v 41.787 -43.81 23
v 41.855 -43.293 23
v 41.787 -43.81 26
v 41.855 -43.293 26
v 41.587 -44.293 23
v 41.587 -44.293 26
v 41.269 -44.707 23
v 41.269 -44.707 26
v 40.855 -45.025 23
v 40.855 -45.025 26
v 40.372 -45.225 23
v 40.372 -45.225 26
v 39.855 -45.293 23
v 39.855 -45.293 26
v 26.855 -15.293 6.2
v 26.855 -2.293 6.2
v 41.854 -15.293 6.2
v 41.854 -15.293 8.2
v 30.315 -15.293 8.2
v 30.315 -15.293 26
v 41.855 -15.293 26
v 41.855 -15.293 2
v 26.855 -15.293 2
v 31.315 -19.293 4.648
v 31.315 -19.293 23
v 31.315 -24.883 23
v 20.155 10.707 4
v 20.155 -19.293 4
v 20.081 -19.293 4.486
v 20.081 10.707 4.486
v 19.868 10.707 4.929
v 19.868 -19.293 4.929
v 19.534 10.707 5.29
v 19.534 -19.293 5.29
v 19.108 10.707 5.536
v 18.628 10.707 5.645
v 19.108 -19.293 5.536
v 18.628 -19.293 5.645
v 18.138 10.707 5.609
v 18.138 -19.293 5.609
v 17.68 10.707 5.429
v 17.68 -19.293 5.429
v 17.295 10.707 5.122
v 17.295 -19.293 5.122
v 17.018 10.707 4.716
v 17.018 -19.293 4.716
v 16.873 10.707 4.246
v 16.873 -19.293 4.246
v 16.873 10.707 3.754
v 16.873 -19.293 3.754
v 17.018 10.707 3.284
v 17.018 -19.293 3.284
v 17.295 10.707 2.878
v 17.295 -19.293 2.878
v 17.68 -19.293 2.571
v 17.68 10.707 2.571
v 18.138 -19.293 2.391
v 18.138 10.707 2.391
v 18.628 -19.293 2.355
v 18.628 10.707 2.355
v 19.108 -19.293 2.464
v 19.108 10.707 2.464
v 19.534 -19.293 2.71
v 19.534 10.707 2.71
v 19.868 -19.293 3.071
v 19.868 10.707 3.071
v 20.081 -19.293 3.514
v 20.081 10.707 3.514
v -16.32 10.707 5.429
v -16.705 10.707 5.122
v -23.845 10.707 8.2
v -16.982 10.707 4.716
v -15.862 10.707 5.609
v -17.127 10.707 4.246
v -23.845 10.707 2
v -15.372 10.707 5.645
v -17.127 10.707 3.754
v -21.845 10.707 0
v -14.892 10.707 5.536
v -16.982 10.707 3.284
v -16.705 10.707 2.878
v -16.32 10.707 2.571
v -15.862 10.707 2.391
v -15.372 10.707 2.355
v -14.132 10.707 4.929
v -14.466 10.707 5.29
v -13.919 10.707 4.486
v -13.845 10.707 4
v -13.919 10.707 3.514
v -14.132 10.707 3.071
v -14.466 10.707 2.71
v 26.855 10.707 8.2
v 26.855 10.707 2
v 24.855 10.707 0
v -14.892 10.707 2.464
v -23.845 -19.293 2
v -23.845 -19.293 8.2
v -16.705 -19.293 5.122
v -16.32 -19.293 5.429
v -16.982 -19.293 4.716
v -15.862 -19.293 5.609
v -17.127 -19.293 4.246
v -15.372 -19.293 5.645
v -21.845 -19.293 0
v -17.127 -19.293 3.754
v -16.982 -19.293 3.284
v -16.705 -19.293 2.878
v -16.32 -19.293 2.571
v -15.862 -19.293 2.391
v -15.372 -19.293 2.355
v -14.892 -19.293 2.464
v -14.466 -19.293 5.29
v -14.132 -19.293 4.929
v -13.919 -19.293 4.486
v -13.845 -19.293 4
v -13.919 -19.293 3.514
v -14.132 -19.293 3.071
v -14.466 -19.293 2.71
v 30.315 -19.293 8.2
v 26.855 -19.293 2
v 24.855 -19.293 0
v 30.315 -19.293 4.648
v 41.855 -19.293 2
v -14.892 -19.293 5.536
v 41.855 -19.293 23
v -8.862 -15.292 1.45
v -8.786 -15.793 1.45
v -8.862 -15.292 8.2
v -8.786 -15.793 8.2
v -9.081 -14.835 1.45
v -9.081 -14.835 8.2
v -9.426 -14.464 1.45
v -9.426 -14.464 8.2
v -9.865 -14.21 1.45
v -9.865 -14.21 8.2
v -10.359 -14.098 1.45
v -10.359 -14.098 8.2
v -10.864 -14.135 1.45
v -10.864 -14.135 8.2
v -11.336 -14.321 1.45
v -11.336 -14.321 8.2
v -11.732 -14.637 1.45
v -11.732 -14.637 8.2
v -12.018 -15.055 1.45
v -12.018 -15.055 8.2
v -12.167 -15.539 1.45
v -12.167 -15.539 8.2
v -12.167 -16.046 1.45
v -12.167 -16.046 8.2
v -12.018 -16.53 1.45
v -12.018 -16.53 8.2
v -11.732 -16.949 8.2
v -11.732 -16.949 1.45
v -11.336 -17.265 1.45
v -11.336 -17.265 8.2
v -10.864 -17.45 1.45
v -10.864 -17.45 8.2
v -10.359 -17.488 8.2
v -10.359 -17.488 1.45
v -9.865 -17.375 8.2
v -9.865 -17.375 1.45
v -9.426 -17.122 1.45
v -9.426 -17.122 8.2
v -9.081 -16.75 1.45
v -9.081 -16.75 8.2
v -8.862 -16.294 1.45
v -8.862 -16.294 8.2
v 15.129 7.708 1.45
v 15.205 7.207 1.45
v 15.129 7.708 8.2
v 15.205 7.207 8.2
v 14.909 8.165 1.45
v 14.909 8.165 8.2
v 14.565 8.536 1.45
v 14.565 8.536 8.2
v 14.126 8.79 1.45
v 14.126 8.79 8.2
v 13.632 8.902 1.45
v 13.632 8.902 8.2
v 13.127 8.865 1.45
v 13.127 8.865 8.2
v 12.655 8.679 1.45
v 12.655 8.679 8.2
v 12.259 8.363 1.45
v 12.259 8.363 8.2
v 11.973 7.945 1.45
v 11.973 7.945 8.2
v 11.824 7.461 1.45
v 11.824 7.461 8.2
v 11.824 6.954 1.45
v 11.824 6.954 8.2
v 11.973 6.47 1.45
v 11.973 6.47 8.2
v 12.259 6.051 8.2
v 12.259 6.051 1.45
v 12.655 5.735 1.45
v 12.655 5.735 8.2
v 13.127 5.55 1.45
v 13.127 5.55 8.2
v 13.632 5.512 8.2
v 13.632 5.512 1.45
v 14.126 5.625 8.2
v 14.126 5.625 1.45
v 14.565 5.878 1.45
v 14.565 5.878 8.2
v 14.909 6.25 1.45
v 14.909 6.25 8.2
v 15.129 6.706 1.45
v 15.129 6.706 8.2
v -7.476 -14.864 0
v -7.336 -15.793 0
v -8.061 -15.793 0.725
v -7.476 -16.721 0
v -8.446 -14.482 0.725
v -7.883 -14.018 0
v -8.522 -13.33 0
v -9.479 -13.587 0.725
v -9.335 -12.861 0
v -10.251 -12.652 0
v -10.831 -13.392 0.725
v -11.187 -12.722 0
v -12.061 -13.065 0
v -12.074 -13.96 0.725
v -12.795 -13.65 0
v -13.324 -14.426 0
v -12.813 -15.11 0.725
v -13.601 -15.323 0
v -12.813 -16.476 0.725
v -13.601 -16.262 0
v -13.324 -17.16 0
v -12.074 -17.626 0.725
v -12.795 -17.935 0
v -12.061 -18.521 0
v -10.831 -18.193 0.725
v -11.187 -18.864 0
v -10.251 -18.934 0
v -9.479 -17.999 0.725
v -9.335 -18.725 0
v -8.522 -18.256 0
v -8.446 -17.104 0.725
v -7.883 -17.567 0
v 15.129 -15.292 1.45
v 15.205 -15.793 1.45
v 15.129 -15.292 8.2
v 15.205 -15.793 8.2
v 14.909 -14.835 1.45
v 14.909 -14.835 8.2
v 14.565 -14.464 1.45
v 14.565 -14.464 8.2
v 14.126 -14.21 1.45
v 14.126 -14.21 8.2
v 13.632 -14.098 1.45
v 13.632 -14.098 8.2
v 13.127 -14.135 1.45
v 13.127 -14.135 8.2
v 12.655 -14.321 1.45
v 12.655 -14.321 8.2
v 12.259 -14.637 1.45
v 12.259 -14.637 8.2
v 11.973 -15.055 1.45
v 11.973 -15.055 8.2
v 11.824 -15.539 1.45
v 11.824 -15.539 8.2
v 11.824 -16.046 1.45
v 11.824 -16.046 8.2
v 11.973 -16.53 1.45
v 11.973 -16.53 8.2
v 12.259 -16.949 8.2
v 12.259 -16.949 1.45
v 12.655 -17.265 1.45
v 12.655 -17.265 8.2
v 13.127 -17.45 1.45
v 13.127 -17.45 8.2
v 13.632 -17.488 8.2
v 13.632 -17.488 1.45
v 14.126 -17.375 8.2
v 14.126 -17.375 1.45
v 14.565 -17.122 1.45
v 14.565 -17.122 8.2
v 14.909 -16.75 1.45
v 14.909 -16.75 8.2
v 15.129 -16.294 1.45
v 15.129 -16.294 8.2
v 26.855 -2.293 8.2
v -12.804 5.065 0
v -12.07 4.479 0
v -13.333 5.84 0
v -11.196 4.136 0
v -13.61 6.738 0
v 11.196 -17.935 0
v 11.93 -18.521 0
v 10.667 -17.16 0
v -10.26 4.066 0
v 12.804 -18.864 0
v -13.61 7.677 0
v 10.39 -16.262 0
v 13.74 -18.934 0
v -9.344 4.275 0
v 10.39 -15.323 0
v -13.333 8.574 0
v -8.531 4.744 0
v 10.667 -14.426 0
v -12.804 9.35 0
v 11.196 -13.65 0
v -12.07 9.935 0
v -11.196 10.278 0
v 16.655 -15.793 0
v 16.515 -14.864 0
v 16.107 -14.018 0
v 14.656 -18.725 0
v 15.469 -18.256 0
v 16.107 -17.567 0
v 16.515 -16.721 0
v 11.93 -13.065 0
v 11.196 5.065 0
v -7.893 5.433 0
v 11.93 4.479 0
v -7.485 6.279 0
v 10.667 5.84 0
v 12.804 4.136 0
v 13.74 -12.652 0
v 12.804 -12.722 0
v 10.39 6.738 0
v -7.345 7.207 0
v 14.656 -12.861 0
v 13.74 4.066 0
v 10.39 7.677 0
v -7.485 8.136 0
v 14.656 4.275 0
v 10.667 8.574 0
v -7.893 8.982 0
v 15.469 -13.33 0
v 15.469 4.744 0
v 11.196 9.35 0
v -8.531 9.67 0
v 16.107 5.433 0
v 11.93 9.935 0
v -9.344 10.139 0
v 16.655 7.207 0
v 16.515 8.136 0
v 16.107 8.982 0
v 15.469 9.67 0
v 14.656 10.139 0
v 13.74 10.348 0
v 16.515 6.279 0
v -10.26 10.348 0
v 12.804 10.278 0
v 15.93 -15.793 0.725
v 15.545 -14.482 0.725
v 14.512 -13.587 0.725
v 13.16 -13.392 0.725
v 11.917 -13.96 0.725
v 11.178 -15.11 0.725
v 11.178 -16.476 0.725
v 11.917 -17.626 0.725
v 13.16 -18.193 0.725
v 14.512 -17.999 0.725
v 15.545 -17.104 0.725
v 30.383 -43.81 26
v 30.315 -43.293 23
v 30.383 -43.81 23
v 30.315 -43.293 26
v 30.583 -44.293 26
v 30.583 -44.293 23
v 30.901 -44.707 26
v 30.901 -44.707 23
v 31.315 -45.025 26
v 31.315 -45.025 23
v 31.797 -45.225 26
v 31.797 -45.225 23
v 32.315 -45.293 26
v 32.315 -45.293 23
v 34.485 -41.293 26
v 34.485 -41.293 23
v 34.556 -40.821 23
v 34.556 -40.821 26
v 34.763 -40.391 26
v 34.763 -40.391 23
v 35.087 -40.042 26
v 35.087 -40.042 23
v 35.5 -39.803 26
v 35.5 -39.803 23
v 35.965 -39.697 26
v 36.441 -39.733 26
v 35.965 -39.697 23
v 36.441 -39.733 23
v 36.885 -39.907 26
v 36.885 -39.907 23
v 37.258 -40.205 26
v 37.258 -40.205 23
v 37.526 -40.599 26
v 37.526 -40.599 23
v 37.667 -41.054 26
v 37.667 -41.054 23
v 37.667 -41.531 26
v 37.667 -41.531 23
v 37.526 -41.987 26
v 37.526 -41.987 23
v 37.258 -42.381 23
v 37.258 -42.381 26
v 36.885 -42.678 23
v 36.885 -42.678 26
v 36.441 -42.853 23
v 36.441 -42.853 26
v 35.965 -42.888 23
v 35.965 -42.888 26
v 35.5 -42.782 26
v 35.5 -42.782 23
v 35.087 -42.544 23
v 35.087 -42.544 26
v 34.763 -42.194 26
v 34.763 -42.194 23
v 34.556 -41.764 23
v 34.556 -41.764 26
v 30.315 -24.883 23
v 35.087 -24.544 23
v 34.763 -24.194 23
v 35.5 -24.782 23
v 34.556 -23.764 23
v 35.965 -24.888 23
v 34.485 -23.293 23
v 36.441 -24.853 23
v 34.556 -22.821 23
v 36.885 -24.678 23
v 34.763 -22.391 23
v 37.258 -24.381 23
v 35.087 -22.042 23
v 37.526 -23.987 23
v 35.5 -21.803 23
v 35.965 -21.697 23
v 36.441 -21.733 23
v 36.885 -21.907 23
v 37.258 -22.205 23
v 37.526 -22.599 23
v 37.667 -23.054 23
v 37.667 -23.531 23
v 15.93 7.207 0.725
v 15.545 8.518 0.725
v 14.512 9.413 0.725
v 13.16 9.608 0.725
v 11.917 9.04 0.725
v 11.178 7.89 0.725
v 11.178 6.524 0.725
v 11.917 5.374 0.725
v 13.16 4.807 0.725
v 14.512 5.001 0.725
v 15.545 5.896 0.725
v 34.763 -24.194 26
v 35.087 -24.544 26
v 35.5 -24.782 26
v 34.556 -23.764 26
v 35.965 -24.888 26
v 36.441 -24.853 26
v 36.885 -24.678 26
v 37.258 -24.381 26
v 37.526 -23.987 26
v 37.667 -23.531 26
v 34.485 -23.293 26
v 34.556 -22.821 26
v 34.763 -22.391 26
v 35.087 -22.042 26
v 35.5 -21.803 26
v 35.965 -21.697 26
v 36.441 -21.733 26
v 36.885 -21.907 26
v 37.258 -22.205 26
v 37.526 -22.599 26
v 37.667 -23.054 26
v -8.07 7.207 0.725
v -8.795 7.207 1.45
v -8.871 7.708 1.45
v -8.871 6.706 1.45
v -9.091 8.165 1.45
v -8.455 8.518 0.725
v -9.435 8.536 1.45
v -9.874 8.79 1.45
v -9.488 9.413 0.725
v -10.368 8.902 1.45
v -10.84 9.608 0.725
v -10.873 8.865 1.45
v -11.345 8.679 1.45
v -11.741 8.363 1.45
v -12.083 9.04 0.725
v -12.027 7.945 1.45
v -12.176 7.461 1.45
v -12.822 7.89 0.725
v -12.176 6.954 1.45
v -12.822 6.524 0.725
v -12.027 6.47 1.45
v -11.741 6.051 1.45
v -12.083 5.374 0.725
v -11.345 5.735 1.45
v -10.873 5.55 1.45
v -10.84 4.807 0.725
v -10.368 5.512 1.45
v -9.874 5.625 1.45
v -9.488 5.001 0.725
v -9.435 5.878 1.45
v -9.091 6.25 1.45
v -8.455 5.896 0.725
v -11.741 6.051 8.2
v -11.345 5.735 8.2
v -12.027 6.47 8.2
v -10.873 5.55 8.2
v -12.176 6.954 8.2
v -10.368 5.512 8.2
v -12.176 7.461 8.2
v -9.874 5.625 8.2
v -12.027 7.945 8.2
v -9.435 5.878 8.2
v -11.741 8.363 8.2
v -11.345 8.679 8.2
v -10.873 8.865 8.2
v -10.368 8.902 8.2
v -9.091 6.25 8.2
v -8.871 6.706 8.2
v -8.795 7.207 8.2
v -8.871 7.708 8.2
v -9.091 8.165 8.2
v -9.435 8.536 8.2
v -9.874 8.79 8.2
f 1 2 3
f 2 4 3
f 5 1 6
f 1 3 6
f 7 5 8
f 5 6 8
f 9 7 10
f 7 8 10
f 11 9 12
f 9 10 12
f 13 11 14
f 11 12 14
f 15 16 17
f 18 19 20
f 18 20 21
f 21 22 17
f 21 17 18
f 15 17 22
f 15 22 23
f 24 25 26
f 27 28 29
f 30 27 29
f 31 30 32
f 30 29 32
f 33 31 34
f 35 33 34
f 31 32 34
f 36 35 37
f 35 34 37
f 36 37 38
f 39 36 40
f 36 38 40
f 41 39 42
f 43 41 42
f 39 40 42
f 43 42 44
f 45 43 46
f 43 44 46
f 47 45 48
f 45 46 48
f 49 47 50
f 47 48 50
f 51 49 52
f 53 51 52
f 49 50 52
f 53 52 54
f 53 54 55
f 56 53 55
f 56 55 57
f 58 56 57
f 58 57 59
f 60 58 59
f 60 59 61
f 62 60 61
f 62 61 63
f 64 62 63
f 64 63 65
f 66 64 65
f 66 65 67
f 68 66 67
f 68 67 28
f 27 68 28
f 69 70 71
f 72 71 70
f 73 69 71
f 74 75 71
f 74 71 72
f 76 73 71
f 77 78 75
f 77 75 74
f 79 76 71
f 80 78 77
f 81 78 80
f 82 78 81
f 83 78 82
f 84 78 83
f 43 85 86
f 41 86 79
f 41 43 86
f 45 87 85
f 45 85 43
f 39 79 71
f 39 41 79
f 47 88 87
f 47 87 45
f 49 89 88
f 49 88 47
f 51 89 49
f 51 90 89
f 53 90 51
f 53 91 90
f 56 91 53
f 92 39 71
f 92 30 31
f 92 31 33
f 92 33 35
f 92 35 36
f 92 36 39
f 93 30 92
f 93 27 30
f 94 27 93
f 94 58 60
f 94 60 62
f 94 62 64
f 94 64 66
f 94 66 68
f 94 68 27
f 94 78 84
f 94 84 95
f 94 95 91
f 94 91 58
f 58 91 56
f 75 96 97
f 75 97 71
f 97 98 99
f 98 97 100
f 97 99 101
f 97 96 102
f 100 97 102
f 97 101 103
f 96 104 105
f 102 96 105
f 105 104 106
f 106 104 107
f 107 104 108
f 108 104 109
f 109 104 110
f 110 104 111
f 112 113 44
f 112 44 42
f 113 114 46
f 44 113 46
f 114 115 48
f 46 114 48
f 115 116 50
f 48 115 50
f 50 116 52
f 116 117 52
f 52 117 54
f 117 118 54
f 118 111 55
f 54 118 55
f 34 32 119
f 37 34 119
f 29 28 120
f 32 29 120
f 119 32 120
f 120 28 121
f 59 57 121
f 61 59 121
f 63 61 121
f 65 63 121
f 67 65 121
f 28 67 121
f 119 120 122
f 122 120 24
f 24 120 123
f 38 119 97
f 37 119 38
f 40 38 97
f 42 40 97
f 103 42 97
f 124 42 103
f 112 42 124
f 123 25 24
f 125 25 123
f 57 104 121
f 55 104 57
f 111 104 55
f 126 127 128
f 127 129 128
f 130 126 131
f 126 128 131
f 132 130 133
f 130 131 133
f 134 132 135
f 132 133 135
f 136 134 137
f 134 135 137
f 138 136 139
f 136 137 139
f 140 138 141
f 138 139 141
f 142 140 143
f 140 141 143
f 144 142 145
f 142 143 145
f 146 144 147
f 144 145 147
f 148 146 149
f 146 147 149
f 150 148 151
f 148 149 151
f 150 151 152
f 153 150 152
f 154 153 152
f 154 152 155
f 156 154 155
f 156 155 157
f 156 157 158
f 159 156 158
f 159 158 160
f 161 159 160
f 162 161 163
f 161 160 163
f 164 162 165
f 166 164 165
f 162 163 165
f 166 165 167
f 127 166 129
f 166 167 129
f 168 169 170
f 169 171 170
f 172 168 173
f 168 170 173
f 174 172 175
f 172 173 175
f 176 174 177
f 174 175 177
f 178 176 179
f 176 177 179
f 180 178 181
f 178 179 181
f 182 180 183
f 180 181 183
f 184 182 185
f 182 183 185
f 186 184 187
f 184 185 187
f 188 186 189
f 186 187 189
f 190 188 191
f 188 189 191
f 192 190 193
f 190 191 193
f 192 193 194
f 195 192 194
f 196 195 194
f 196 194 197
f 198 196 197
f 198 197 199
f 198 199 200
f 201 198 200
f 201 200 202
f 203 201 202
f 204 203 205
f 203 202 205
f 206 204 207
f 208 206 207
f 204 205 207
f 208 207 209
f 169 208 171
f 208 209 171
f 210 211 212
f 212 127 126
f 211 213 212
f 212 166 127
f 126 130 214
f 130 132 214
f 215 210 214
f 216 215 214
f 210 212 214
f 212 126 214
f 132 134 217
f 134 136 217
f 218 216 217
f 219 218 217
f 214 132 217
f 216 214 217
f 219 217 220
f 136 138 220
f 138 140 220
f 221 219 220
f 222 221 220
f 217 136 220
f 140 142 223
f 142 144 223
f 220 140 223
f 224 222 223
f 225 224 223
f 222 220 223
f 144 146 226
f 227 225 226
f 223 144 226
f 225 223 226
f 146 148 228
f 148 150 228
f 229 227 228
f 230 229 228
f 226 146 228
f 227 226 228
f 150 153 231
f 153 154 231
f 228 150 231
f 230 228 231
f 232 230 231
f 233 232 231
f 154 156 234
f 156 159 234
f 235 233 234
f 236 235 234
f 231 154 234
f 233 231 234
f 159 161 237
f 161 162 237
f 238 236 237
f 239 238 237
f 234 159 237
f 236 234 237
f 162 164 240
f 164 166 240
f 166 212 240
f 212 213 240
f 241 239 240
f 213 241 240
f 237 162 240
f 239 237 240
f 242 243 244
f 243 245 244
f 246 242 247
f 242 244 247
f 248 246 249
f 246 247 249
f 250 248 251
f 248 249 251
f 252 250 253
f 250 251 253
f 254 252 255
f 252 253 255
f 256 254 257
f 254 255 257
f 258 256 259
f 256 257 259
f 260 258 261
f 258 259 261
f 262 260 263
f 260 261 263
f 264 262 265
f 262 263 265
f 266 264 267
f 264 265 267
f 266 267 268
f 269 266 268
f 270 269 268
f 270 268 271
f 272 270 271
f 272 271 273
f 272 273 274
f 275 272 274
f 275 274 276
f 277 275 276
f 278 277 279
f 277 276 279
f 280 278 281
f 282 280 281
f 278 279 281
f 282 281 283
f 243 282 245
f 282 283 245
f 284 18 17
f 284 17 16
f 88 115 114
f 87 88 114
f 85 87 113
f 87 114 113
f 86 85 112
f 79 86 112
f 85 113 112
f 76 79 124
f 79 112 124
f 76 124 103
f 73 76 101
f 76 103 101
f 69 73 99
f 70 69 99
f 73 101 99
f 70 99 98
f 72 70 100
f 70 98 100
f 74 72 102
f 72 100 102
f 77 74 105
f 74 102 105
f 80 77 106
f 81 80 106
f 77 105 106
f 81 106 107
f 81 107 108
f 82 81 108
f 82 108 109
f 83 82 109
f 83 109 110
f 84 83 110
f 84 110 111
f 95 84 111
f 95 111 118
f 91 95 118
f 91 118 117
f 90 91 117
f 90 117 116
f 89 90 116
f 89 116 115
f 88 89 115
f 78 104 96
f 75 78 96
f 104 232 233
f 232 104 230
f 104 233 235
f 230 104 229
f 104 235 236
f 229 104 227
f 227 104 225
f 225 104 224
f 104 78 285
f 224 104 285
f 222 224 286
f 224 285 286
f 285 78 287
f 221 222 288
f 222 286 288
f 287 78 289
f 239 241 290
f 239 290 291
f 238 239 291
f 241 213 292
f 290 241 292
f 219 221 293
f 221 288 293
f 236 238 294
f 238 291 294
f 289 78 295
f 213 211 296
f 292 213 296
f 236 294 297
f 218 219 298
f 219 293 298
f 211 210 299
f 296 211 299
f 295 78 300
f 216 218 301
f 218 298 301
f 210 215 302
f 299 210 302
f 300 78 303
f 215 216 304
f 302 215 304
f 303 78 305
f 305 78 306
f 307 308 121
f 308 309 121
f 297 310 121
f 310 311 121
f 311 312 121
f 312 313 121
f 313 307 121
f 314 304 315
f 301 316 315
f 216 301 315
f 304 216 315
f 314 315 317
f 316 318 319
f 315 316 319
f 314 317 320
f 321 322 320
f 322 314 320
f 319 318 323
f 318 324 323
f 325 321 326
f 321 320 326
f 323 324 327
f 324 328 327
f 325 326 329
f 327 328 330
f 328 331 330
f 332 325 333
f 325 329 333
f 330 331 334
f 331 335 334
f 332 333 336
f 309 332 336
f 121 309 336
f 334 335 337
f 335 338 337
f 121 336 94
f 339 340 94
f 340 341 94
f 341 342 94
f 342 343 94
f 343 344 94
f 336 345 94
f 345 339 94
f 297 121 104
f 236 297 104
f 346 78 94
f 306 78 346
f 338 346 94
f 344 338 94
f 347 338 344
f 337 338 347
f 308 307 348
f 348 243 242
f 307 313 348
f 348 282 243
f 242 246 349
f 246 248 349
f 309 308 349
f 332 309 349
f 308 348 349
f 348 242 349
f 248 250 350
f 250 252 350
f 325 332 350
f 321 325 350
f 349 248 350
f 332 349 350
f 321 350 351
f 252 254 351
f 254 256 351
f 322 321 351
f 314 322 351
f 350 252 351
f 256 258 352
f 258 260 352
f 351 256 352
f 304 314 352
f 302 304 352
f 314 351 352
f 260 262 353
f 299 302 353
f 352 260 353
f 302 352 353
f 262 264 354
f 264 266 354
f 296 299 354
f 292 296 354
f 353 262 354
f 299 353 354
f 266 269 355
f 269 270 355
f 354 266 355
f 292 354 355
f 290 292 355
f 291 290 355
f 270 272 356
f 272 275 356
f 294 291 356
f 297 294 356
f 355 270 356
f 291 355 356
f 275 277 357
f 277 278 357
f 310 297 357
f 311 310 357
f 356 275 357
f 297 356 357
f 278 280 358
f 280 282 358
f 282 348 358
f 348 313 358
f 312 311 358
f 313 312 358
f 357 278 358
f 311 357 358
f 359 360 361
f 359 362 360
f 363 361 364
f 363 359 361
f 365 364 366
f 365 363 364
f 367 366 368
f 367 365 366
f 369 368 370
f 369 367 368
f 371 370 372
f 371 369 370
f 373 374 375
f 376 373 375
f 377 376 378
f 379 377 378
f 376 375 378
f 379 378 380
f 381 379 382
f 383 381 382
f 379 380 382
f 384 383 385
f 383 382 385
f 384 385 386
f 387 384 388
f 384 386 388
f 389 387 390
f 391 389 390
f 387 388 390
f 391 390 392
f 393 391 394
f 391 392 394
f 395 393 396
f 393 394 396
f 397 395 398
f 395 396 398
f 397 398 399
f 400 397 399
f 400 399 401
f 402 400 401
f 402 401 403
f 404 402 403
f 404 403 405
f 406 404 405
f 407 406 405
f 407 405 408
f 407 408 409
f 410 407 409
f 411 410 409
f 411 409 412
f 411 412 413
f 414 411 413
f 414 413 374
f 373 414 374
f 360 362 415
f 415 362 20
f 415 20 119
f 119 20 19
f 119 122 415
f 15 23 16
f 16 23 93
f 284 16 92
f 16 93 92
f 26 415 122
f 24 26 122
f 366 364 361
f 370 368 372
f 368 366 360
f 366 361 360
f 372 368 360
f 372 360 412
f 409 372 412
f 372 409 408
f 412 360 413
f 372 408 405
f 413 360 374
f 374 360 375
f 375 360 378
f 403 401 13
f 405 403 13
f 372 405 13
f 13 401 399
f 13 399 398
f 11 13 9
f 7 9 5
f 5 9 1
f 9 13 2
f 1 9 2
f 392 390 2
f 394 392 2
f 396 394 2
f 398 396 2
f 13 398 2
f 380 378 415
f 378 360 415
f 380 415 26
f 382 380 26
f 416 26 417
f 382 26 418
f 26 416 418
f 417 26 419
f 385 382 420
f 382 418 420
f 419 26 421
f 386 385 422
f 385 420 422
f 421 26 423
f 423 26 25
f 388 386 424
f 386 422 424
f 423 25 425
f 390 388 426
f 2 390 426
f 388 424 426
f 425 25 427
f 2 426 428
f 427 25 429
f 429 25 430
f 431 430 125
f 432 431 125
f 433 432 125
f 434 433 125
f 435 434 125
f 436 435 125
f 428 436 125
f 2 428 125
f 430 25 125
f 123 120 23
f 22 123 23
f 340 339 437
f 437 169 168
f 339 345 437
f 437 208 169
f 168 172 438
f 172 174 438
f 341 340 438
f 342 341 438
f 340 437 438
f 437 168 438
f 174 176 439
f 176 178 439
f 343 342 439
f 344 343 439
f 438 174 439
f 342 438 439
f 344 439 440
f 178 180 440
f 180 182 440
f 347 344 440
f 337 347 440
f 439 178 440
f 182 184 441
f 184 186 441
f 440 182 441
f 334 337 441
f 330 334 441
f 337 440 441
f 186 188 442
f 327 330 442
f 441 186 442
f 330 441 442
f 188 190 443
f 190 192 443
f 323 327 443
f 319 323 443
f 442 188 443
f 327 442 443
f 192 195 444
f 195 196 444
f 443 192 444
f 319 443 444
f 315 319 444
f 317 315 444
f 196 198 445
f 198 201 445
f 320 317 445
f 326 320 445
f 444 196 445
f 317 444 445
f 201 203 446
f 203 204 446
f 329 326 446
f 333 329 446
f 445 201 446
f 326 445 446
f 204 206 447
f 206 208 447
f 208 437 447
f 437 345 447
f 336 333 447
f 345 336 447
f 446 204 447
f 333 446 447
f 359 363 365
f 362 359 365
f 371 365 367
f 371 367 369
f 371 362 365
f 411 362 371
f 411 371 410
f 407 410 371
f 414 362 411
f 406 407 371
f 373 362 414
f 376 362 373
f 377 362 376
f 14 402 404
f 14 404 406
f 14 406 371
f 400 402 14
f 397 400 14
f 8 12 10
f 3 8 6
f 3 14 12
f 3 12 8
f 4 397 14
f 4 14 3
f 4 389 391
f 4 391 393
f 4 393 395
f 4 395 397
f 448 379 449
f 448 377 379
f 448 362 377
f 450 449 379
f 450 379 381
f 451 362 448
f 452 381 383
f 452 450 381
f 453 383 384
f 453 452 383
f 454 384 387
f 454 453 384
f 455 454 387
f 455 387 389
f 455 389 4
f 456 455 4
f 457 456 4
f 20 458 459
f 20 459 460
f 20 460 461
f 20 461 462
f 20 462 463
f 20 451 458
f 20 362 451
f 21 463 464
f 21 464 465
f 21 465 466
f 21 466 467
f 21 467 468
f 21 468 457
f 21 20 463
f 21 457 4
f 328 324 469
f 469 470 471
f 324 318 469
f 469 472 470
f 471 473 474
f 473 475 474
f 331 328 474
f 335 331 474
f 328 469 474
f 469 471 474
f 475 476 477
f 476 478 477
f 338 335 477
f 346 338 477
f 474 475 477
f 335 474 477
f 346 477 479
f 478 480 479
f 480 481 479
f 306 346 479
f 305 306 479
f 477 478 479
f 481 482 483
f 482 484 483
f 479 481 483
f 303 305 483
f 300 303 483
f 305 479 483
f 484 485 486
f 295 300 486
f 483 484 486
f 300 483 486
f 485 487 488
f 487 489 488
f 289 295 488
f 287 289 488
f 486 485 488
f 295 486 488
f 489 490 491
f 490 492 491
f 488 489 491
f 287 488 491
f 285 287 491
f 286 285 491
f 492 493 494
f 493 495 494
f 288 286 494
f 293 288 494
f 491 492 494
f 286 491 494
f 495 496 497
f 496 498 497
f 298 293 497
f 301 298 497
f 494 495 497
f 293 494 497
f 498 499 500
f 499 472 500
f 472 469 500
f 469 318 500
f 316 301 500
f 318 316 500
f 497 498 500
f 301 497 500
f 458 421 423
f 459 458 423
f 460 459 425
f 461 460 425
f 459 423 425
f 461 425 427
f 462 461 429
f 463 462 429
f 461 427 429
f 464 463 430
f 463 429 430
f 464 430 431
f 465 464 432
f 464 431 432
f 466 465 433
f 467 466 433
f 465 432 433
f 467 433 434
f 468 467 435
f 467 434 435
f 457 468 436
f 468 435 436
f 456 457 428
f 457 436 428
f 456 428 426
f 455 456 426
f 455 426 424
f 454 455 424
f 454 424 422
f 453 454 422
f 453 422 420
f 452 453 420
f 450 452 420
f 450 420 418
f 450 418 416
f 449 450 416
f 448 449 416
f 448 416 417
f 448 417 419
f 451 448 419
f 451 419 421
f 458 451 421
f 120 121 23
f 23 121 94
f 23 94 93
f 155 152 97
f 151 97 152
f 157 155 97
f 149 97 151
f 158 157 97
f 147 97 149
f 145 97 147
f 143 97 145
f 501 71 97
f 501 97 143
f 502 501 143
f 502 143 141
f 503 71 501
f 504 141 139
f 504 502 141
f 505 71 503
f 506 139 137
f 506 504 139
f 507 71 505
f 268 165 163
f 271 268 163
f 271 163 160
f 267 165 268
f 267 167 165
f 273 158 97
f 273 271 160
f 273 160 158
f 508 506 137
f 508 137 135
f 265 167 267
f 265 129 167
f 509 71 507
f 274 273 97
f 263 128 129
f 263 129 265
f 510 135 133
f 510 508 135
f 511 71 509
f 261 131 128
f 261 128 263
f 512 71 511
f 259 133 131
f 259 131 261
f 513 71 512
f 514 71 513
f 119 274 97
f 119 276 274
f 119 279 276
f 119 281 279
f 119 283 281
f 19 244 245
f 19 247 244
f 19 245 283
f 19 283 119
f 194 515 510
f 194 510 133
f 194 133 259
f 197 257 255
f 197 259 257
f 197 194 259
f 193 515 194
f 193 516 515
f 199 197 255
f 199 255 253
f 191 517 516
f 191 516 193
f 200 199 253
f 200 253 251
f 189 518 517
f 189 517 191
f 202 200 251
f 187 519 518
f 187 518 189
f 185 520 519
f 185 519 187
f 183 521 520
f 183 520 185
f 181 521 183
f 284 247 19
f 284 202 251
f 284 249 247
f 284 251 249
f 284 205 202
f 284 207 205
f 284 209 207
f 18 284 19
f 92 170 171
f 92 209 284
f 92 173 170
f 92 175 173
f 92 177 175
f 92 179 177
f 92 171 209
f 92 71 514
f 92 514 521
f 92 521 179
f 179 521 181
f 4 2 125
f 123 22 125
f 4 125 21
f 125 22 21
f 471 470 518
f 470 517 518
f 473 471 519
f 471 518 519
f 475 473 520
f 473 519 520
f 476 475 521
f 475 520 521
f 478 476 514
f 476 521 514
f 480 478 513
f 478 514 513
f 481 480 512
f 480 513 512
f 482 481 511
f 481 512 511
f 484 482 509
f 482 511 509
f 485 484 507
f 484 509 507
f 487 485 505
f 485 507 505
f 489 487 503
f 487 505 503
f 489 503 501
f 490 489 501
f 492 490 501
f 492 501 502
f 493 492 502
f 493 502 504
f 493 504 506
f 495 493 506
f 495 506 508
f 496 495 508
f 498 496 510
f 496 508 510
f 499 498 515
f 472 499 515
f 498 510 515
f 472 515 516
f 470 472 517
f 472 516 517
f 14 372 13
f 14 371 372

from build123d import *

# Parameters (mm, degrees)
SKETCH_1_W                   = 50.7
SKETCH_1_H                   = 30
EXTRUDE_1_DEPTH              = 8.2
CUT_EXTRUDE_1_DEPTH          = 31
HOLE_WIZARD_M3_1_D           = 3.4
HOLE_WIZARD_M3_1_CSINK_D     = 6.3
HOLE_WIZARD_M3_1_CSINK_ANGLE = 90
SKETCH_5_R                   = 1.65
CUT_EXTRUDE_2_DEPTH          = 31
SKETCH_6_W                   = 6.2
SKETCH_6_H                   = 5
EXTRUDE_2_DEPTH              = 15
SKETCH_9_W                   = 11.54
SKETCH_9_H                   = 5
EXTRUDE_7_DEPTH              = 17.8
SKETCH_10_W                  = 11.54
SKETCH_10_H                  = 3
EXTRUDE_8_DEPTH              = 26
SKETCH_11_R                  = 1.6
CUT_EXTRUDE_3_DEPTH          = 4
EXTRUDE_10_DEPTH             = 1
FILLET_1_R                   = 2
CUT_EXTRUDE_4_DEPTH          = 1
EXTRUDE_11_DEPTH             = 2


with BuildPart() as part:
    # 草图1 → 凸台-拉伸1 (new body)
    with BuildSketch(Plane.XY):
        with Locations((1.504794521, -4.292808219)):
            Rectangle(SKETCH_1_W, SKETCH_1_H)
    extrude(amount=EXTRUDE_1_DEPTH)

    # 草图2 → 切除-拉伸1 (cut, through all)
    with BuildSketch(Plane(origin=(0, 10.707191781, 0), x_dir=(1, 0, 0), z_dir=(0, 1, 0))):
        Polygon((-21.845205479, 0), (-23.845205479, -2), (-23.845205479, 0), align=None)
        Polygon((24.854794521, 0), (26.854794521, -2), (26.854794521, 0), align=None)
    extrude(amount=-CUT_EXTRUDE_1_DEPTH, mode=Mode.SUBTRACT)

    # M3 平头机械螺钉的锥形沉头孔1 (through all)
    with Locations(Plane(origin=(-10.486055507, -15.792808219, 0), x_dir=(-1, 0, 0), z_dir=(0, 0, -1))):
        with Locations((0, 0), (-23.990850028, 0), (-23.990850028, 23), (0.009149972, 23)):
            CounterSinkHole(HOLE_WIZARD_M3_1_D / 2, HOLE_WIZARD_M3_1_CSINK_D / 2, counter_sink_angle=HOLE_WIZARD_M3_1_CSINK_ANGLE)

    # 草图5 → 切除-拉伸2 (cut, through all)
    with BuildSketch(Plane.XZ.offset(19.292808219)):
        with Locations((-15.495205479, 4)):
            Circle(SKETCH_5_R)
        with Locations((18.504794521, 4)):
            Circle(SKETCH_5_R)
    extrude(amount=-CUT_EXTRUDE_2_DEPTH, mode=Mode.SUBTRACT)

    # 草图6 → 凸台-拉伸2 (add)
    with BuildSketch(Plane(origin=(26.854794521, 0, 0), x_dir=(0, 0, -1), z_dir=(1, 0, 0))):
        with Locations((-5.1, -16.792808219)):
            Rectangle(SKETCH_6_W, SKETCH_6_H)
    extrude(amount=EXTRUDE_2_DEPTH)

    # 草图9 → 凸台-拉伸7 (add)
    with BuildSketch(Plane.XY.offset(8.2)):
        with Locations((36.084794521, -16.792808219)):
            Rectangle(SKETCH_9_W, SKETCH_9_H)
    extrude(amount=EXTRUDE_7_DEPTH)

    # 草图10 → 凸台-拉伸8 (add)
    with BuildSketch(Plane.XZ.offset(19.292808219)):
        with Locations((36.084794521, 24.5)):
            Rectangle(SKETCH_10_W, SKETCH_10_H)
    extrude(amount=EXTRUDE_8_DEPTH)

    # 草图11 → 切除-拉伸3 (cut, through all)
    with BuildSketch(Plane(origin=(0, 0, 23), x_dir=(-1, 0, 0), z_dir=(0, 0, -1))):
        with Locations((-36.084794521, -41.292808219)):
            Circle(SKETCH_11_R)
        with Locations((-36.084794521, -23.292808219)):
            Circle(SKETCH_11_R)
    extrude(amount=-CUT_EXTRUDE_3_DEPTH, mode=Mode.SUBTRACT)

    # 草图15 → 凸台-拉伸10 (add)
    with BuildSketch(Plane.ZY.offset(-30.314794521)):
        Polygon((23, -24.883219003), (4.647869492, -19.292808219), (23, -19.292808219), align=None)
    extrude(amount=-EXTRUDE_10_DEPTH)

    # 圆角1
    fillet_1_edges = [part.edges().sort_by_distance(p)[0] for p in [
        (30.314794521, -45.292808219, 24.5),
        (41.854794521, -45.292808219, 24.5),
    ]]
    fillet(fillet_1_edges, radius=FILLET_1_R)

    # 草图17 → 切除-拉伸4 (cut)
    with BuildSketch(Plane(origin=(0, -14.292808219, 0), x_dir=(1, 0, 0), z_dir=(0, 1, 0))):
        Polygon((26.854794521, -8.2), (30.314794521, -8.2), (30.314794521, -26), (41.854794521, -26), (41.854794521, -2), (26.854794521, -2), align=None)
    extrude(amount=-CUT_EXTRUDE_4_DEPTH, mode=Mode.SUBTRACT)

    # 草图18 → 凸台-拉伸11 (add)
    with BuildSketch(Plane.XY.offset(8.2)):
        Polygon((26.854794521, -15.292808219), (30.314794521, -15.292808219), (41.854261071, -15.292808219), (26.854794521, -2.292808219), align=None)
    extrude(amount=-EXTRUDE_11_DEPTH)


solid = part.part
